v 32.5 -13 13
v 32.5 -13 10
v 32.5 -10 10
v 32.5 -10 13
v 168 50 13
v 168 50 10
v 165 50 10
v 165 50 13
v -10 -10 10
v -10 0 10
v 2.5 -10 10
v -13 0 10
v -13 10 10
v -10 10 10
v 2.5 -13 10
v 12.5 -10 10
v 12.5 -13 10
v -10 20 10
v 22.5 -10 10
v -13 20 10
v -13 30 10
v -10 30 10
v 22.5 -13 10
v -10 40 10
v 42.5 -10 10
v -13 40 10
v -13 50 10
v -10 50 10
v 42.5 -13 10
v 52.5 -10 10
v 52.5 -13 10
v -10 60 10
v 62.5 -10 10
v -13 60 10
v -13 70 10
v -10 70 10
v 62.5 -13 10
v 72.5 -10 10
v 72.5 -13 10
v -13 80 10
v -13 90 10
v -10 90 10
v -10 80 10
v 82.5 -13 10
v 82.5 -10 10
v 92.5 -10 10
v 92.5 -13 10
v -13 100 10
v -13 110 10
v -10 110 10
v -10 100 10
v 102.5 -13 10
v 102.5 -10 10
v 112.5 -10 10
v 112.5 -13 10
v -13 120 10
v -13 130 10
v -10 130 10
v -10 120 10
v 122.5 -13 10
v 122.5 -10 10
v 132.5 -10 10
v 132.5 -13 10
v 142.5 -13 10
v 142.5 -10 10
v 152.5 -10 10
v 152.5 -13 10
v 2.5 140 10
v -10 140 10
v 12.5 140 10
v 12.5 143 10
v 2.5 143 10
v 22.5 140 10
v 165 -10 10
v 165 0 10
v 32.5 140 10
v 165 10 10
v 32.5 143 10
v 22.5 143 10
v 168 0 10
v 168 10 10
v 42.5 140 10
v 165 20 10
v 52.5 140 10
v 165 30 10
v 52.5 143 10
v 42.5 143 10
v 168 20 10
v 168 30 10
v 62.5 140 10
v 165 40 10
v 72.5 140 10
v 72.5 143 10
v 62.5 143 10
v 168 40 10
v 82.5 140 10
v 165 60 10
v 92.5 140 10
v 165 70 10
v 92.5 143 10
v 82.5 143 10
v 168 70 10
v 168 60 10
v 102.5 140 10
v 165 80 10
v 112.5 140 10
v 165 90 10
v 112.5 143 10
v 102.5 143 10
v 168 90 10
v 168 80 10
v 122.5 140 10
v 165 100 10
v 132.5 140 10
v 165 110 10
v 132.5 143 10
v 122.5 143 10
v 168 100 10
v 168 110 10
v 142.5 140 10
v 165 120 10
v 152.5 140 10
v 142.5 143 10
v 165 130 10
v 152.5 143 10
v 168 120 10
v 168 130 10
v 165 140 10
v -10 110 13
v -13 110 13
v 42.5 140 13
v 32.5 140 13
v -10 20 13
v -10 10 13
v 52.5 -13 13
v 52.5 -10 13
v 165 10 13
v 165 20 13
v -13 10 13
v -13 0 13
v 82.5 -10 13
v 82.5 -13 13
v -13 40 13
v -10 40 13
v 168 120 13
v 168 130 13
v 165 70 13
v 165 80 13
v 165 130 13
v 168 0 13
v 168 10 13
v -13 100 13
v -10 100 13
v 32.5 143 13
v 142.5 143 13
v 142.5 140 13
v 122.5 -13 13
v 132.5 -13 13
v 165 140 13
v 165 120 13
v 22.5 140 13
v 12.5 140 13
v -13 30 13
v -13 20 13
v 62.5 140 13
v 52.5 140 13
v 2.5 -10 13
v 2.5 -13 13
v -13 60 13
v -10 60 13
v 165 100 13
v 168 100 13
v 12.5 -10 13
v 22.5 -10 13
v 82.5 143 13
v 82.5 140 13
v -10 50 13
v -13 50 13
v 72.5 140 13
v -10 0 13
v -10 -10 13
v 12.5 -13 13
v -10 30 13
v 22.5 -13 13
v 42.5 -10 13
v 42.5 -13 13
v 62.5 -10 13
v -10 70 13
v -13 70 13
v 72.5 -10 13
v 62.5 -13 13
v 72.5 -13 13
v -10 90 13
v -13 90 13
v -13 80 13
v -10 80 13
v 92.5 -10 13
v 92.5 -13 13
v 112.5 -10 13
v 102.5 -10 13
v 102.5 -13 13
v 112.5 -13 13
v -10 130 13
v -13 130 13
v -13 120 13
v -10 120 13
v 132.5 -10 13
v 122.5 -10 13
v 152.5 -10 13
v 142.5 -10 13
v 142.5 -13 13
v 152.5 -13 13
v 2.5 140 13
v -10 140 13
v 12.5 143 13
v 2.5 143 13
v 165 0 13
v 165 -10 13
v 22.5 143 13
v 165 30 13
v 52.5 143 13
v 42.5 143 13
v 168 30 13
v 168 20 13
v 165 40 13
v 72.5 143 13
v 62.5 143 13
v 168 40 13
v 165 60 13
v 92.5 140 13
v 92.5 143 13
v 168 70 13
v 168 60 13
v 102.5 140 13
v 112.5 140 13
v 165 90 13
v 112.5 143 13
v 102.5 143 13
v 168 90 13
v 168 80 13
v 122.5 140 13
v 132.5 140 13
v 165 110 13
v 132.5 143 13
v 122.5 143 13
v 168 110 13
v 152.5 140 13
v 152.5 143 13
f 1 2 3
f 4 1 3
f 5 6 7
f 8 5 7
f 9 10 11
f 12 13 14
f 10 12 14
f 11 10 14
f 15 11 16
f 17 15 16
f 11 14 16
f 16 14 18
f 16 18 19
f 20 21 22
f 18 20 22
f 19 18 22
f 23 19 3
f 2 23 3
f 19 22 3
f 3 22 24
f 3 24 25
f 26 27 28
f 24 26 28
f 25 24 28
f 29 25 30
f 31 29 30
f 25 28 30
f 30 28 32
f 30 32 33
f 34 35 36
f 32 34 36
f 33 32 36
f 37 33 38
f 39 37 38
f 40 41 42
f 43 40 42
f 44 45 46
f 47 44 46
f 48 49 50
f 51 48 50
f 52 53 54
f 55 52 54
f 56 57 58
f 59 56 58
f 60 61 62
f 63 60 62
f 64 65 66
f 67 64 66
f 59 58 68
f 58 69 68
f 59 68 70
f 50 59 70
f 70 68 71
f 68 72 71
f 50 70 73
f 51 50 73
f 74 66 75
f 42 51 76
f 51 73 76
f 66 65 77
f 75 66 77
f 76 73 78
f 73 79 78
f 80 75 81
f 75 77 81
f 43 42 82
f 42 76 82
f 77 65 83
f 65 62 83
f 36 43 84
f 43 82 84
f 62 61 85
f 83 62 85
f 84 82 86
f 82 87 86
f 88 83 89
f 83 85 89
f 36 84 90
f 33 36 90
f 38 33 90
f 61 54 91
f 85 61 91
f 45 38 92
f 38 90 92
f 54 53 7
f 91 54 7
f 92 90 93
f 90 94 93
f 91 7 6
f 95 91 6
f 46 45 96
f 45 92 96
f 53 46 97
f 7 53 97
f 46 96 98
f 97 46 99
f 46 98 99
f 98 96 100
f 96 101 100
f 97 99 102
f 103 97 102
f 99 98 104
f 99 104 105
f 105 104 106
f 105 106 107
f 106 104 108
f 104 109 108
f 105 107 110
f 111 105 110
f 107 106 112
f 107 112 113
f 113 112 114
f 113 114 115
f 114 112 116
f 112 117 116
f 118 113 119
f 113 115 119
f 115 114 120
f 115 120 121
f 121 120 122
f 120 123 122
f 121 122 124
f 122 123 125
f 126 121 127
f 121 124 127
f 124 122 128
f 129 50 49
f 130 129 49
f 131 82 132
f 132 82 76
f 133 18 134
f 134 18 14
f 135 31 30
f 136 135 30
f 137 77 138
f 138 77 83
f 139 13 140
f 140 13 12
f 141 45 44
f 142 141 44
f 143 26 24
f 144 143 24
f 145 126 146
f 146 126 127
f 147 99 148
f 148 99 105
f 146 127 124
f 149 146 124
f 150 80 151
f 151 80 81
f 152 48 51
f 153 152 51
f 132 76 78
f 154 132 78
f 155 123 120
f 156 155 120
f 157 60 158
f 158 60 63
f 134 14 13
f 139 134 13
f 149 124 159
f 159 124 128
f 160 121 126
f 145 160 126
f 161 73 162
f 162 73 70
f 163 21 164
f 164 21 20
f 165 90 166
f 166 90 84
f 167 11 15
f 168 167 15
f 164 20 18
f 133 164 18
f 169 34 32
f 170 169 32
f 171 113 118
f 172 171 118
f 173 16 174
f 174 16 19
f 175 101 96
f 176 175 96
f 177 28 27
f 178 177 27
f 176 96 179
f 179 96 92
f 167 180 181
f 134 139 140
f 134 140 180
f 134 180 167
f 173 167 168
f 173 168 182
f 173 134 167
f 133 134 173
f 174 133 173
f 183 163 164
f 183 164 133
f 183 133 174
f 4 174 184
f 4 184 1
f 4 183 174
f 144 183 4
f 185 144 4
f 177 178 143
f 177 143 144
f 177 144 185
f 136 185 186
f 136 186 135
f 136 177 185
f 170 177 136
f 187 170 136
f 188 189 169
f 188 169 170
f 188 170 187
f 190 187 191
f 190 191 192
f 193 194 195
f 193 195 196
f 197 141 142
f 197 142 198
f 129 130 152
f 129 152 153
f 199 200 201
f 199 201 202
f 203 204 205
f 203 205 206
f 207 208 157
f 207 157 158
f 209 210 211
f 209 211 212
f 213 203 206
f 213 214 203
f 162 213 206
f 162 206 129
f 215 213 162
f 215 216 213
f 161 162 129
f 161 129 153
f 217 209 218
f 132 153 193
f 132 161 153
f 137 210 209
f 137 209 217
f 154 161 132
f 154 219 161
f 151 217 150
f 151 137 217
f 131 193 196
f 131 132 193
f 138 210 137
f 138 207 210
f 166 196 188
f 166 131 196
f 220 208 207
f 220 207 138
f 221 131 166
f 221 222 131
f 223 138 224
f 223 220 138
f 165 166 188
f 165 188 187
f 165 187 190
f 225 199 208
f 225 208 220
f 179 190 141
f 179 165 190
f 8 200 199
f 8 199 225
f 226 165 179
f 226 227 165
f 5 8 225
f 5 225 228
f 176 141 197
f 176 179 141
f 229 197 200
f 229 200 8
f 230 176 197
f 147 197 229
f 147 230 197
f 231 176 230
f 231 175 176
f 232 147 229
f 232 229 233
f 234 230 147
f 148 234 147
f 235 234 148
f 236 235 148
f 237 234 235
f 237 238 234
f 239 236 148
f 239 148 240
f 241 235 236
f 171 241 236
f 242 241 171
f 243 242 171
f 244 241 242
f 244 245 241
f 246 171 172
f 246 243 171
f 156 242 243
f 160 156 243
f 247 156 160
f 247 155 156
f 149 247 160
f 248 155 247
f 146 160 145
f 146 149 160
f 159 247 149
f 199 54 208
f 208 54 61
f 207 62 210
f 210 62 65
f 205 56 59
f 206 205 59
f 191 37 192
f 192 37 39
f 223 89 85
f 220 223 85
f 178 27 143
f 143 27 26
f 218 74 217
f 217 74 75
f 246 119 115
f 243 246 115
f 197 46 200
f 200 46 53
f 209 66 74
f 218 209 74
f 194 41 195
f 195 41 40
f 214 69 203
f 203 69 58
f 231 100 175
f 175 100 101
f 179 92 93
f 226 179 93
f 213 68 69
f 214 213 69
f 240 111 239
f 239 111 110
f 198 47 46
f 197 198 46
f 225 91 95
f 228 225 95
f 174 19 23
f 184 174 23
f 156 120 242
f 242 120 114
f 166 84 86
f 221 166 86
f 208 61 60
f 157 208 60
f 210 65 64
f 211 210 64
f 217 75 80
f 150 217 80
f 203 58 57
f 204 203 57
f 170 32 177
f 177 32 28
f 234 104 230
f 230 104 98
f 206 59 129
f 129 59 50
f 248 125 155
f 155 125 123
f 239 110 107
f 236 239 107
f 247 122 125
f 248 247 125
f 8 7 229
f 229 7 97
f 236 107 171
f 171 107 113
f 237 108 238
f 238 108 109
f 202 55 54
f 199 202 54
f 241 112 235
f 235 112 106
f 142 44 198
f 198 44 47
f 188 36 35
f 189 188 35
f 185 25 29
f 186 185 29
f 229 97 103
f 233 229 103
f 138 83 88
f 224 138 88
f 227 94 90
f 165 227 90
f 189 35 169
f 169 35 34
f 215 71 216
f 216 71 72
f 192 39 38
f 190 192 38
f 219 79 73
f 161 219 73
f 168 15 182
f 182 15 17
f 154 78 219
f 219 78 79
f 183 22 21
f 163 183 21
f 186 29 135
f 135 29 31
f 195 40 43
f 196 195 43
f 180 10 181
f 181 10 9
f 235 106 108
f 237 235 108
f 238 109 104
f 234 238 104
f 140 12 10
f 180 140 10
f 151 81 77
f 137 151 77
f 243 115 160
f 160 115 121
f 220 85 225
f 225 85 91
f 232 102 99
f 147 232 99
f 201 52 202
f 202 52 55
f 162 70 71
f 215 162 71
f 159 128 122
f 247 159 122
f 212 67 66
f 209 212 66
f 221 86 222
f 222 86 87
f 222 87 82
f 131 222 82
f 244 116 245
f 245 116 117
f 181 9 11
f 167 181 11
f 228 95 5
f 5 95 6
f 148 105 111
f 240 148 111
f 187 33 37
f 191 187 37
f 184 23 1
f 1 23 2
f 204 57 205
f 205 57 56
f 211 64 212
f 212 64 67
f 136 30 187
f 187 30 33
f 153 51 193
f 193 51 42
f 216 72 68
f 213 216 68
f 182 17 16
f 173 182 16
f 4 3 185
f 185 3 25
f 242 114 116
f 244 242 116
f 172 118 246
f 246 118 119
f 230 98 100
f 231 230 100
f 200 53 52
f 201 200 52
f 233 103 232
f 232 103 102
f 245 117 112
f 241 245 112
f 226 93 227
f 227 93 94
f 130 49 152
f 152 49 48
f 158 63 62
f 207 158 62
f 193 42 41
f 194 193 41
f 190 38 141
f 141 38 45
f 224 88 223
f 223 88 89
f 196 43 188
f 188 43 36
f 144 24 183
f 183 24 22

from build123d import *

# Parameters (mm, degrees)
BOSS_EXTRUDE1_DEPTH = 3


with BuildPart() as part:
    # Sketch1 → Boss-Extrude1 (new body)
    with BuildSketch(Plane.XY.offset(10)):
        Polygon((12.5, -13), (12.5, -10), (22.5, -10), (22.5, -13), (32.5, -13), (32.5, -10), (42.5, -10), (42.5, -13), (52.5, -13), (52.5, -10), (62.5, -10), (62.5, -13), (72.5, -13), (72.5, -10), (82.5, -10), (82.5, -13), (92.5, -13), (92.5, -10), (102.5, -10), (102.5, -13), (112.5, -13), (112.5, -10), (122.5, -10), (122.5, -13), (132.5, -13), (132.5, -10), (142.5, -10), (142.5, -13), (152.5, -13), (152.5, -10), (165, -10), (165, 0), (168, 0), (168, 10), (165, 10), (165, 20), (168, 20), (168, 30), (165, 30), (165, 40), (168, 40), (168, 50), (165, 50), (165, 60), (168, 60), (168, 70), (165, 70), (165, 80), (168, 80), (168, 90), (165, 90), (165, 100), (168, 100), (168, 110), (165, 110), (165, 120), (168, 120), (168, 130), (165, 130), (165, 140), (152.5, 140), (152.5, 143), (142.5, 143), (142.5, 140), (132.5, 140), (132.5, 143), (122.5, 143), (122.5, 140), (112.5, 140), (112.5, 143), (102.5, 143), (102.5, 140), (92.5, 140), (92.5, 143), (82.5, 143), (82.5, 140), (72.5, 140), (72.5, 143), (62.5, 143), (62.5, 140), (52.5, 140), (52.5, 143), (42.5, 143), (42.5, 140), (32.5, 140), (32.5, 143), (22.5, 143), (22.5, 140), (12.5, 140), (12.5, 143), (2.5, 143), (2.5, 140), (-10, 140), (-10, 130), (-13, 130), (-13, 120), (-10, 120), (-10, 110), (-13, 110), (-13, 100), (-10, 100), (-10, 90), (-13, 90), (-13, 80), (-10, 80), (-10, 70), (-13, 70), (-13, 60), (-10, 60), (-10, 50), (-13, 50), (-13, 40), (-10, 40), (-10, 30), (-13, 30), (-13, 20), (-10, 20), (-10, 10), (-13, 10), (-13, 0), (-10, 0), (-10, -10), (2.5, -10), (2.5, -13), align=None)
    extrude(amount=BOSS_EXTRUDE1_DEPTH)


solid = part.part
